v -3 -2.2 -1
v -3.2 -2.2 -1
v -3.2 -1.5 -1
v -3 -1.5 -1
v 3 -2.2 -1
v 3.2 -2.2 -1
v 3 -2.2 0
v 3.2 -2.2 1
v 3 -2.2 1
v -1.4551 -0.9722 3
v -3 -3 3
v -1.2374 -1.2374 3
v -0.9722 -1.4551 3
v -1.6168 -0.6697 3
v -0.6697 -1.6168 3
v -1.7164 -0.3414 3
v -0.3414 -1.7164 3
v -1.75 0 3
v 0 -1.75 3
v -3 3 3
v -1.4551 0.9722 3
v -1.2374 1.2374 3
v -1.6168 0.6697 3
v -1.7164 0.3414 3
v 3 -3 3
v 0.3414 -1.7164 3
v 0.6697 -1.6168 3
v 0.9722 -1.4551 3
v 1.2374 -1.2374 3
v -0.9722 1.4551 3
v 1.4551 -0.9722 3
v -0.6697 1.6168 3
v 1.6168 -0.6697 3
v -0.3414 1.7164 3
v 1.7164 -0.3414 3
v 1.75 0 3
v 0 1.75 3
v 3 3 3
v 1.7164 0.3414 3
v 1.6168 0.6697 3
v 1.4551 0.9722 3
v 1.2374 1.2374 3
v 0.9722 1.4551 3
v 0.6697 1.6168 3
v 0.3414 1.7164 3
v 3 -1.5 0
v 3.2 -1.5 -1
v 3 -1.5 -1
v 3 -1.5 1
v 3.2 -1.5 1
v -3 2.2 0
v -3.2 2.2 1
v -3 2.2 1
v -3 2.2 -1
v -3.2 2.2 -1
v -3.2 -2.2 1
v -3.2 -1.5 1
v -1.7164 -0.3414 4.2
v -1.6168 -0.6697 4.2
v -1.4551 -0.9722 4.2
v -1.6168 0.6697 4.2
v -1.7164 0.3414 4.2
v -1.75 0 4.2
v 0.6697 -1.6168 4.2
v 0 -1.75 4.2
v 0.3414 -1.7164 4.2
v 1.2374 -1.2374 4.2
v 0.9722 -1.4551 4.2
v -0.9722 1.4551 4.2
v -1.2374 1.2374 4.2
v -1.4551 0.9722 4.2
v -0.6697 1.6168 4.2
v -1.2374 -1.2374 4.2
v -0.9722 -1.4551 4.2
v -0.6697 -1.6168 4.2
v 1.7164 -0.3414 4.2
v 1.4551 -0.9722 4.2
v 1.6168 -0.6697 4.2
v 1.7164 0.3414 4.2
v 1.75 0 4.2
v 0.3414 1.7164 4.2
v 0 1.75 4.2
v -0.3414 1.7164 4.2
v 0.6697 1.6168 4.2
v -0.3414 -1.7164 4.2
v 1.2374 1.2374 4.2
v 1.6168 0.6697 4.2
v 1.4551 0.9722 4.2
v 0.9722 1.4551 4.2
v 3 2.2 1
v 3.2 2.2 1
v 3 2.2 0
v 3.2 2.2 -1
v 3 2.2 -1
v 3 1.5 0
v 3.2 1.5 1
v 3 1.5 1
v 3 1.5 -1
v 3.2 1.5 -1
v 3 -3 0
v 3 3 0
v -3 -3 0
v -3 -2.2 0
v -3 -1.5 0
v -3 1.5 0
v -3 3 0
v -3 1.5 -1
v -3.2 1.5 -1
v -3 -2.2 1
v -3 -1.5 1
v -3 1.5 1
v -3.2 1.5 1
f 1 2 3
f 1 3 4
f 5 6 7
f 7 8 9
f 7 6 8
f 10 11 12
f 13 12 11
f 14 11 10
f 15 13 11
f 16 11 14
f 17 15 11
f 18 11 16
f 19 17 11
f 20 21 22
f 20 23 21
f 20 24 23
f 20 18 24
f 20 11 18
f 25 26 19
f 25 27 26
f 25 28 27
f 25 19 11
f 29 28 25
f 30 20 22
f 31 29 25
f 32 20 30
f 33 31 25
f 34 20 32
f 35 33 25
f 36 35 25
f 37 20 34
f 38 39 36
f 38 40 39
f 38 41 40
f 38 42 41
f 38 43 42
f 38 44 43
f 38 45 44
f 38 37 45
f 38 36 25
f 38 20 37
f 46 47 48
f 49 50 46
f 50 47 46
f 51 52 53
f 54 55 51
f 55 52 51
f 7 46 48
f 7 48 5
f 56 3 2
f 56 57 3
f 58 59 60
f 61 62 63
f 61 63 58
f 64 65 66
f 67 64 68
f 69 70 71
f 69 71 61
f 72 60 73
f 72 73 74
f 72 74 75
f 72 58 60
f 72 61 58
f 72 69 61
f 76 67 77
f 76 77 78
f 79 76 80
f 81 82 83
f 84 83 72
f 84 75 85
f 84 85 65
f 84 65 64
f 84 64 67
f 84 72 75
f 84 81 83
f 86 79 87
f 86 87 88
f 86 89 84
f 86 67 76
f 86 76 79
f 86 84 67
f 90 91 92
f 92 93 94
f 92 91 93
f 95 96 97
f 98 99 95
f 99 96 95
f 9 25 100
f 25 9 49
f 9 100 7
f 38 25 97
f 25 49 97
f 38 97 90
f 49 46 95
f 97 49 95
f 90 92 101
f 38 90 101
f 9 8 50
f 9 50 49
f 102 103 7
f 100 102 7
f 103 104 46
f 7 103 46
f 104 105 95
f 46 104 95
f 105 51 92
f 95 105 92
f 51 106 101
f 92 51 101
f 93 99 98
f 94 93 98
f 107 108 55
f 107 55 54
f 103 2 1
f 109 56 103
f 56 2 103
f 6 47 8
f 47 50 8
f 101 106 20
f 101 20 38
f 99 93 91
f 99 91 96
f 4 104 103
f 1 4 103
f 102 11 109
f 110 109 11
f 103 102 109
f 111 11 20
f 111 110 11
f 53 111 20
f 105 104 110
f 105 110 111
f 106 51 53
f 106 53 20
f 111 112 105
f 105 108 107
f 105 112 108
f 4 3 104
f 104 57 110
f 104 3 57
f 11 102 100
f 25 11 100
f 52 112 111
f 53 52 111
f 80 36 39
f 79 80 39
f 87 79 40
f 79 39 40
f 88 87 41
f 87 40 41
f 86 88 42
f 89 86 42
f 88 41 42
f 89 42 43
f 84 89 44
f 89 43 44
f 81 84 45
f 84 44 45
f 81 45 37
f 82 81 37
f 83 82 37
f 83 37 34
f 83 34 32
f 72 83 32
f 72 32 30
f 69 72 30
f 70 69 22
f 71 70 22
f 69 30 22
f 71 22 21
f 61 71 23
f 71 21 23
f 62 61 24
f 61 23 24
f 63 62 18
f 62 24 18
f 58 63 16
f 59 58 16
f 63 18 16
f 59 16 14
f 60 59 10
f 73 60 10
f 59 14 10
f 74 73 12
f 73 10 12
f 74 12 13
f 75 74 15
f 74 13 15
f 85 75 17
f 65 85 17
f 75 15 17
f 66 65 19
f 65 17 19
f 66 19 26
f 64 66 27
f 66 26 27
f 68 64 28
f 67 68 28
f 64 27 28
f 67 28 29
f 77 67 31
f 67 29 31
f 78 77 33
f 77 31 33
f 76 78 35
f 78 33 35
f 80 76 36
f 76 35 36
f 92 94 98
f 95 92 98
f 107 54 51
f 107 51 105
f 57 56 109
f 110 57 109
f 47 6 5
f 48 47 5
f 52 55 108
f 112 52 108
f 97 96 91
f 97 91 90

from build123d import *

# Parameters (mm, degrees)
SKETCH_W     = 6
SKETCH_H     = 6
PAD_DEPTH    = 3
SKETCH001_R  = 1.75
PAD001_DEPTH = 1.2
SKETCH002_W  = 0.2
SKETCH002_H  = 0.7
PAD002_DEPTH = 1


with BuildPart() as part:
    # Sketch → Pad (new body)
    with BuildSketch(Plane.XY):
        Rectangle(SKETCH_W, SKETCH_H)
    extrude(amount=PAD_DEPTH)

    # Sketch001 (on Face6 of Pad) → Pad001 (join)
    with BuildSketch(Plane.XY.offset(3)):
        Circle(SKETCH001_R)
    extrude(amount=PAD001_DEPTH)

    # Sketch002 (on Face4 of Pad001) → Pad002 (join, symmetric)
    with BuildSketch(Plane(origin=(0, 0, 0), x_dir=(1, 0, 0), z_dir=(0, 0, -1))):
        with Locations((-3.1, 1.85)):
            Rectangle(SKETCH002_W, SKETCH002_H)
        with Locations((-3.1, -1.85)):
            Rectangle(SKETCH002_W, SKETCH002_H)
    pad002 = extrude(amount=PAD002_DEPTH, both=True)

    # Mirrored: Pad002 across YZ
    add(pad002.mirror(Plane.YZ))


solid = part.part
